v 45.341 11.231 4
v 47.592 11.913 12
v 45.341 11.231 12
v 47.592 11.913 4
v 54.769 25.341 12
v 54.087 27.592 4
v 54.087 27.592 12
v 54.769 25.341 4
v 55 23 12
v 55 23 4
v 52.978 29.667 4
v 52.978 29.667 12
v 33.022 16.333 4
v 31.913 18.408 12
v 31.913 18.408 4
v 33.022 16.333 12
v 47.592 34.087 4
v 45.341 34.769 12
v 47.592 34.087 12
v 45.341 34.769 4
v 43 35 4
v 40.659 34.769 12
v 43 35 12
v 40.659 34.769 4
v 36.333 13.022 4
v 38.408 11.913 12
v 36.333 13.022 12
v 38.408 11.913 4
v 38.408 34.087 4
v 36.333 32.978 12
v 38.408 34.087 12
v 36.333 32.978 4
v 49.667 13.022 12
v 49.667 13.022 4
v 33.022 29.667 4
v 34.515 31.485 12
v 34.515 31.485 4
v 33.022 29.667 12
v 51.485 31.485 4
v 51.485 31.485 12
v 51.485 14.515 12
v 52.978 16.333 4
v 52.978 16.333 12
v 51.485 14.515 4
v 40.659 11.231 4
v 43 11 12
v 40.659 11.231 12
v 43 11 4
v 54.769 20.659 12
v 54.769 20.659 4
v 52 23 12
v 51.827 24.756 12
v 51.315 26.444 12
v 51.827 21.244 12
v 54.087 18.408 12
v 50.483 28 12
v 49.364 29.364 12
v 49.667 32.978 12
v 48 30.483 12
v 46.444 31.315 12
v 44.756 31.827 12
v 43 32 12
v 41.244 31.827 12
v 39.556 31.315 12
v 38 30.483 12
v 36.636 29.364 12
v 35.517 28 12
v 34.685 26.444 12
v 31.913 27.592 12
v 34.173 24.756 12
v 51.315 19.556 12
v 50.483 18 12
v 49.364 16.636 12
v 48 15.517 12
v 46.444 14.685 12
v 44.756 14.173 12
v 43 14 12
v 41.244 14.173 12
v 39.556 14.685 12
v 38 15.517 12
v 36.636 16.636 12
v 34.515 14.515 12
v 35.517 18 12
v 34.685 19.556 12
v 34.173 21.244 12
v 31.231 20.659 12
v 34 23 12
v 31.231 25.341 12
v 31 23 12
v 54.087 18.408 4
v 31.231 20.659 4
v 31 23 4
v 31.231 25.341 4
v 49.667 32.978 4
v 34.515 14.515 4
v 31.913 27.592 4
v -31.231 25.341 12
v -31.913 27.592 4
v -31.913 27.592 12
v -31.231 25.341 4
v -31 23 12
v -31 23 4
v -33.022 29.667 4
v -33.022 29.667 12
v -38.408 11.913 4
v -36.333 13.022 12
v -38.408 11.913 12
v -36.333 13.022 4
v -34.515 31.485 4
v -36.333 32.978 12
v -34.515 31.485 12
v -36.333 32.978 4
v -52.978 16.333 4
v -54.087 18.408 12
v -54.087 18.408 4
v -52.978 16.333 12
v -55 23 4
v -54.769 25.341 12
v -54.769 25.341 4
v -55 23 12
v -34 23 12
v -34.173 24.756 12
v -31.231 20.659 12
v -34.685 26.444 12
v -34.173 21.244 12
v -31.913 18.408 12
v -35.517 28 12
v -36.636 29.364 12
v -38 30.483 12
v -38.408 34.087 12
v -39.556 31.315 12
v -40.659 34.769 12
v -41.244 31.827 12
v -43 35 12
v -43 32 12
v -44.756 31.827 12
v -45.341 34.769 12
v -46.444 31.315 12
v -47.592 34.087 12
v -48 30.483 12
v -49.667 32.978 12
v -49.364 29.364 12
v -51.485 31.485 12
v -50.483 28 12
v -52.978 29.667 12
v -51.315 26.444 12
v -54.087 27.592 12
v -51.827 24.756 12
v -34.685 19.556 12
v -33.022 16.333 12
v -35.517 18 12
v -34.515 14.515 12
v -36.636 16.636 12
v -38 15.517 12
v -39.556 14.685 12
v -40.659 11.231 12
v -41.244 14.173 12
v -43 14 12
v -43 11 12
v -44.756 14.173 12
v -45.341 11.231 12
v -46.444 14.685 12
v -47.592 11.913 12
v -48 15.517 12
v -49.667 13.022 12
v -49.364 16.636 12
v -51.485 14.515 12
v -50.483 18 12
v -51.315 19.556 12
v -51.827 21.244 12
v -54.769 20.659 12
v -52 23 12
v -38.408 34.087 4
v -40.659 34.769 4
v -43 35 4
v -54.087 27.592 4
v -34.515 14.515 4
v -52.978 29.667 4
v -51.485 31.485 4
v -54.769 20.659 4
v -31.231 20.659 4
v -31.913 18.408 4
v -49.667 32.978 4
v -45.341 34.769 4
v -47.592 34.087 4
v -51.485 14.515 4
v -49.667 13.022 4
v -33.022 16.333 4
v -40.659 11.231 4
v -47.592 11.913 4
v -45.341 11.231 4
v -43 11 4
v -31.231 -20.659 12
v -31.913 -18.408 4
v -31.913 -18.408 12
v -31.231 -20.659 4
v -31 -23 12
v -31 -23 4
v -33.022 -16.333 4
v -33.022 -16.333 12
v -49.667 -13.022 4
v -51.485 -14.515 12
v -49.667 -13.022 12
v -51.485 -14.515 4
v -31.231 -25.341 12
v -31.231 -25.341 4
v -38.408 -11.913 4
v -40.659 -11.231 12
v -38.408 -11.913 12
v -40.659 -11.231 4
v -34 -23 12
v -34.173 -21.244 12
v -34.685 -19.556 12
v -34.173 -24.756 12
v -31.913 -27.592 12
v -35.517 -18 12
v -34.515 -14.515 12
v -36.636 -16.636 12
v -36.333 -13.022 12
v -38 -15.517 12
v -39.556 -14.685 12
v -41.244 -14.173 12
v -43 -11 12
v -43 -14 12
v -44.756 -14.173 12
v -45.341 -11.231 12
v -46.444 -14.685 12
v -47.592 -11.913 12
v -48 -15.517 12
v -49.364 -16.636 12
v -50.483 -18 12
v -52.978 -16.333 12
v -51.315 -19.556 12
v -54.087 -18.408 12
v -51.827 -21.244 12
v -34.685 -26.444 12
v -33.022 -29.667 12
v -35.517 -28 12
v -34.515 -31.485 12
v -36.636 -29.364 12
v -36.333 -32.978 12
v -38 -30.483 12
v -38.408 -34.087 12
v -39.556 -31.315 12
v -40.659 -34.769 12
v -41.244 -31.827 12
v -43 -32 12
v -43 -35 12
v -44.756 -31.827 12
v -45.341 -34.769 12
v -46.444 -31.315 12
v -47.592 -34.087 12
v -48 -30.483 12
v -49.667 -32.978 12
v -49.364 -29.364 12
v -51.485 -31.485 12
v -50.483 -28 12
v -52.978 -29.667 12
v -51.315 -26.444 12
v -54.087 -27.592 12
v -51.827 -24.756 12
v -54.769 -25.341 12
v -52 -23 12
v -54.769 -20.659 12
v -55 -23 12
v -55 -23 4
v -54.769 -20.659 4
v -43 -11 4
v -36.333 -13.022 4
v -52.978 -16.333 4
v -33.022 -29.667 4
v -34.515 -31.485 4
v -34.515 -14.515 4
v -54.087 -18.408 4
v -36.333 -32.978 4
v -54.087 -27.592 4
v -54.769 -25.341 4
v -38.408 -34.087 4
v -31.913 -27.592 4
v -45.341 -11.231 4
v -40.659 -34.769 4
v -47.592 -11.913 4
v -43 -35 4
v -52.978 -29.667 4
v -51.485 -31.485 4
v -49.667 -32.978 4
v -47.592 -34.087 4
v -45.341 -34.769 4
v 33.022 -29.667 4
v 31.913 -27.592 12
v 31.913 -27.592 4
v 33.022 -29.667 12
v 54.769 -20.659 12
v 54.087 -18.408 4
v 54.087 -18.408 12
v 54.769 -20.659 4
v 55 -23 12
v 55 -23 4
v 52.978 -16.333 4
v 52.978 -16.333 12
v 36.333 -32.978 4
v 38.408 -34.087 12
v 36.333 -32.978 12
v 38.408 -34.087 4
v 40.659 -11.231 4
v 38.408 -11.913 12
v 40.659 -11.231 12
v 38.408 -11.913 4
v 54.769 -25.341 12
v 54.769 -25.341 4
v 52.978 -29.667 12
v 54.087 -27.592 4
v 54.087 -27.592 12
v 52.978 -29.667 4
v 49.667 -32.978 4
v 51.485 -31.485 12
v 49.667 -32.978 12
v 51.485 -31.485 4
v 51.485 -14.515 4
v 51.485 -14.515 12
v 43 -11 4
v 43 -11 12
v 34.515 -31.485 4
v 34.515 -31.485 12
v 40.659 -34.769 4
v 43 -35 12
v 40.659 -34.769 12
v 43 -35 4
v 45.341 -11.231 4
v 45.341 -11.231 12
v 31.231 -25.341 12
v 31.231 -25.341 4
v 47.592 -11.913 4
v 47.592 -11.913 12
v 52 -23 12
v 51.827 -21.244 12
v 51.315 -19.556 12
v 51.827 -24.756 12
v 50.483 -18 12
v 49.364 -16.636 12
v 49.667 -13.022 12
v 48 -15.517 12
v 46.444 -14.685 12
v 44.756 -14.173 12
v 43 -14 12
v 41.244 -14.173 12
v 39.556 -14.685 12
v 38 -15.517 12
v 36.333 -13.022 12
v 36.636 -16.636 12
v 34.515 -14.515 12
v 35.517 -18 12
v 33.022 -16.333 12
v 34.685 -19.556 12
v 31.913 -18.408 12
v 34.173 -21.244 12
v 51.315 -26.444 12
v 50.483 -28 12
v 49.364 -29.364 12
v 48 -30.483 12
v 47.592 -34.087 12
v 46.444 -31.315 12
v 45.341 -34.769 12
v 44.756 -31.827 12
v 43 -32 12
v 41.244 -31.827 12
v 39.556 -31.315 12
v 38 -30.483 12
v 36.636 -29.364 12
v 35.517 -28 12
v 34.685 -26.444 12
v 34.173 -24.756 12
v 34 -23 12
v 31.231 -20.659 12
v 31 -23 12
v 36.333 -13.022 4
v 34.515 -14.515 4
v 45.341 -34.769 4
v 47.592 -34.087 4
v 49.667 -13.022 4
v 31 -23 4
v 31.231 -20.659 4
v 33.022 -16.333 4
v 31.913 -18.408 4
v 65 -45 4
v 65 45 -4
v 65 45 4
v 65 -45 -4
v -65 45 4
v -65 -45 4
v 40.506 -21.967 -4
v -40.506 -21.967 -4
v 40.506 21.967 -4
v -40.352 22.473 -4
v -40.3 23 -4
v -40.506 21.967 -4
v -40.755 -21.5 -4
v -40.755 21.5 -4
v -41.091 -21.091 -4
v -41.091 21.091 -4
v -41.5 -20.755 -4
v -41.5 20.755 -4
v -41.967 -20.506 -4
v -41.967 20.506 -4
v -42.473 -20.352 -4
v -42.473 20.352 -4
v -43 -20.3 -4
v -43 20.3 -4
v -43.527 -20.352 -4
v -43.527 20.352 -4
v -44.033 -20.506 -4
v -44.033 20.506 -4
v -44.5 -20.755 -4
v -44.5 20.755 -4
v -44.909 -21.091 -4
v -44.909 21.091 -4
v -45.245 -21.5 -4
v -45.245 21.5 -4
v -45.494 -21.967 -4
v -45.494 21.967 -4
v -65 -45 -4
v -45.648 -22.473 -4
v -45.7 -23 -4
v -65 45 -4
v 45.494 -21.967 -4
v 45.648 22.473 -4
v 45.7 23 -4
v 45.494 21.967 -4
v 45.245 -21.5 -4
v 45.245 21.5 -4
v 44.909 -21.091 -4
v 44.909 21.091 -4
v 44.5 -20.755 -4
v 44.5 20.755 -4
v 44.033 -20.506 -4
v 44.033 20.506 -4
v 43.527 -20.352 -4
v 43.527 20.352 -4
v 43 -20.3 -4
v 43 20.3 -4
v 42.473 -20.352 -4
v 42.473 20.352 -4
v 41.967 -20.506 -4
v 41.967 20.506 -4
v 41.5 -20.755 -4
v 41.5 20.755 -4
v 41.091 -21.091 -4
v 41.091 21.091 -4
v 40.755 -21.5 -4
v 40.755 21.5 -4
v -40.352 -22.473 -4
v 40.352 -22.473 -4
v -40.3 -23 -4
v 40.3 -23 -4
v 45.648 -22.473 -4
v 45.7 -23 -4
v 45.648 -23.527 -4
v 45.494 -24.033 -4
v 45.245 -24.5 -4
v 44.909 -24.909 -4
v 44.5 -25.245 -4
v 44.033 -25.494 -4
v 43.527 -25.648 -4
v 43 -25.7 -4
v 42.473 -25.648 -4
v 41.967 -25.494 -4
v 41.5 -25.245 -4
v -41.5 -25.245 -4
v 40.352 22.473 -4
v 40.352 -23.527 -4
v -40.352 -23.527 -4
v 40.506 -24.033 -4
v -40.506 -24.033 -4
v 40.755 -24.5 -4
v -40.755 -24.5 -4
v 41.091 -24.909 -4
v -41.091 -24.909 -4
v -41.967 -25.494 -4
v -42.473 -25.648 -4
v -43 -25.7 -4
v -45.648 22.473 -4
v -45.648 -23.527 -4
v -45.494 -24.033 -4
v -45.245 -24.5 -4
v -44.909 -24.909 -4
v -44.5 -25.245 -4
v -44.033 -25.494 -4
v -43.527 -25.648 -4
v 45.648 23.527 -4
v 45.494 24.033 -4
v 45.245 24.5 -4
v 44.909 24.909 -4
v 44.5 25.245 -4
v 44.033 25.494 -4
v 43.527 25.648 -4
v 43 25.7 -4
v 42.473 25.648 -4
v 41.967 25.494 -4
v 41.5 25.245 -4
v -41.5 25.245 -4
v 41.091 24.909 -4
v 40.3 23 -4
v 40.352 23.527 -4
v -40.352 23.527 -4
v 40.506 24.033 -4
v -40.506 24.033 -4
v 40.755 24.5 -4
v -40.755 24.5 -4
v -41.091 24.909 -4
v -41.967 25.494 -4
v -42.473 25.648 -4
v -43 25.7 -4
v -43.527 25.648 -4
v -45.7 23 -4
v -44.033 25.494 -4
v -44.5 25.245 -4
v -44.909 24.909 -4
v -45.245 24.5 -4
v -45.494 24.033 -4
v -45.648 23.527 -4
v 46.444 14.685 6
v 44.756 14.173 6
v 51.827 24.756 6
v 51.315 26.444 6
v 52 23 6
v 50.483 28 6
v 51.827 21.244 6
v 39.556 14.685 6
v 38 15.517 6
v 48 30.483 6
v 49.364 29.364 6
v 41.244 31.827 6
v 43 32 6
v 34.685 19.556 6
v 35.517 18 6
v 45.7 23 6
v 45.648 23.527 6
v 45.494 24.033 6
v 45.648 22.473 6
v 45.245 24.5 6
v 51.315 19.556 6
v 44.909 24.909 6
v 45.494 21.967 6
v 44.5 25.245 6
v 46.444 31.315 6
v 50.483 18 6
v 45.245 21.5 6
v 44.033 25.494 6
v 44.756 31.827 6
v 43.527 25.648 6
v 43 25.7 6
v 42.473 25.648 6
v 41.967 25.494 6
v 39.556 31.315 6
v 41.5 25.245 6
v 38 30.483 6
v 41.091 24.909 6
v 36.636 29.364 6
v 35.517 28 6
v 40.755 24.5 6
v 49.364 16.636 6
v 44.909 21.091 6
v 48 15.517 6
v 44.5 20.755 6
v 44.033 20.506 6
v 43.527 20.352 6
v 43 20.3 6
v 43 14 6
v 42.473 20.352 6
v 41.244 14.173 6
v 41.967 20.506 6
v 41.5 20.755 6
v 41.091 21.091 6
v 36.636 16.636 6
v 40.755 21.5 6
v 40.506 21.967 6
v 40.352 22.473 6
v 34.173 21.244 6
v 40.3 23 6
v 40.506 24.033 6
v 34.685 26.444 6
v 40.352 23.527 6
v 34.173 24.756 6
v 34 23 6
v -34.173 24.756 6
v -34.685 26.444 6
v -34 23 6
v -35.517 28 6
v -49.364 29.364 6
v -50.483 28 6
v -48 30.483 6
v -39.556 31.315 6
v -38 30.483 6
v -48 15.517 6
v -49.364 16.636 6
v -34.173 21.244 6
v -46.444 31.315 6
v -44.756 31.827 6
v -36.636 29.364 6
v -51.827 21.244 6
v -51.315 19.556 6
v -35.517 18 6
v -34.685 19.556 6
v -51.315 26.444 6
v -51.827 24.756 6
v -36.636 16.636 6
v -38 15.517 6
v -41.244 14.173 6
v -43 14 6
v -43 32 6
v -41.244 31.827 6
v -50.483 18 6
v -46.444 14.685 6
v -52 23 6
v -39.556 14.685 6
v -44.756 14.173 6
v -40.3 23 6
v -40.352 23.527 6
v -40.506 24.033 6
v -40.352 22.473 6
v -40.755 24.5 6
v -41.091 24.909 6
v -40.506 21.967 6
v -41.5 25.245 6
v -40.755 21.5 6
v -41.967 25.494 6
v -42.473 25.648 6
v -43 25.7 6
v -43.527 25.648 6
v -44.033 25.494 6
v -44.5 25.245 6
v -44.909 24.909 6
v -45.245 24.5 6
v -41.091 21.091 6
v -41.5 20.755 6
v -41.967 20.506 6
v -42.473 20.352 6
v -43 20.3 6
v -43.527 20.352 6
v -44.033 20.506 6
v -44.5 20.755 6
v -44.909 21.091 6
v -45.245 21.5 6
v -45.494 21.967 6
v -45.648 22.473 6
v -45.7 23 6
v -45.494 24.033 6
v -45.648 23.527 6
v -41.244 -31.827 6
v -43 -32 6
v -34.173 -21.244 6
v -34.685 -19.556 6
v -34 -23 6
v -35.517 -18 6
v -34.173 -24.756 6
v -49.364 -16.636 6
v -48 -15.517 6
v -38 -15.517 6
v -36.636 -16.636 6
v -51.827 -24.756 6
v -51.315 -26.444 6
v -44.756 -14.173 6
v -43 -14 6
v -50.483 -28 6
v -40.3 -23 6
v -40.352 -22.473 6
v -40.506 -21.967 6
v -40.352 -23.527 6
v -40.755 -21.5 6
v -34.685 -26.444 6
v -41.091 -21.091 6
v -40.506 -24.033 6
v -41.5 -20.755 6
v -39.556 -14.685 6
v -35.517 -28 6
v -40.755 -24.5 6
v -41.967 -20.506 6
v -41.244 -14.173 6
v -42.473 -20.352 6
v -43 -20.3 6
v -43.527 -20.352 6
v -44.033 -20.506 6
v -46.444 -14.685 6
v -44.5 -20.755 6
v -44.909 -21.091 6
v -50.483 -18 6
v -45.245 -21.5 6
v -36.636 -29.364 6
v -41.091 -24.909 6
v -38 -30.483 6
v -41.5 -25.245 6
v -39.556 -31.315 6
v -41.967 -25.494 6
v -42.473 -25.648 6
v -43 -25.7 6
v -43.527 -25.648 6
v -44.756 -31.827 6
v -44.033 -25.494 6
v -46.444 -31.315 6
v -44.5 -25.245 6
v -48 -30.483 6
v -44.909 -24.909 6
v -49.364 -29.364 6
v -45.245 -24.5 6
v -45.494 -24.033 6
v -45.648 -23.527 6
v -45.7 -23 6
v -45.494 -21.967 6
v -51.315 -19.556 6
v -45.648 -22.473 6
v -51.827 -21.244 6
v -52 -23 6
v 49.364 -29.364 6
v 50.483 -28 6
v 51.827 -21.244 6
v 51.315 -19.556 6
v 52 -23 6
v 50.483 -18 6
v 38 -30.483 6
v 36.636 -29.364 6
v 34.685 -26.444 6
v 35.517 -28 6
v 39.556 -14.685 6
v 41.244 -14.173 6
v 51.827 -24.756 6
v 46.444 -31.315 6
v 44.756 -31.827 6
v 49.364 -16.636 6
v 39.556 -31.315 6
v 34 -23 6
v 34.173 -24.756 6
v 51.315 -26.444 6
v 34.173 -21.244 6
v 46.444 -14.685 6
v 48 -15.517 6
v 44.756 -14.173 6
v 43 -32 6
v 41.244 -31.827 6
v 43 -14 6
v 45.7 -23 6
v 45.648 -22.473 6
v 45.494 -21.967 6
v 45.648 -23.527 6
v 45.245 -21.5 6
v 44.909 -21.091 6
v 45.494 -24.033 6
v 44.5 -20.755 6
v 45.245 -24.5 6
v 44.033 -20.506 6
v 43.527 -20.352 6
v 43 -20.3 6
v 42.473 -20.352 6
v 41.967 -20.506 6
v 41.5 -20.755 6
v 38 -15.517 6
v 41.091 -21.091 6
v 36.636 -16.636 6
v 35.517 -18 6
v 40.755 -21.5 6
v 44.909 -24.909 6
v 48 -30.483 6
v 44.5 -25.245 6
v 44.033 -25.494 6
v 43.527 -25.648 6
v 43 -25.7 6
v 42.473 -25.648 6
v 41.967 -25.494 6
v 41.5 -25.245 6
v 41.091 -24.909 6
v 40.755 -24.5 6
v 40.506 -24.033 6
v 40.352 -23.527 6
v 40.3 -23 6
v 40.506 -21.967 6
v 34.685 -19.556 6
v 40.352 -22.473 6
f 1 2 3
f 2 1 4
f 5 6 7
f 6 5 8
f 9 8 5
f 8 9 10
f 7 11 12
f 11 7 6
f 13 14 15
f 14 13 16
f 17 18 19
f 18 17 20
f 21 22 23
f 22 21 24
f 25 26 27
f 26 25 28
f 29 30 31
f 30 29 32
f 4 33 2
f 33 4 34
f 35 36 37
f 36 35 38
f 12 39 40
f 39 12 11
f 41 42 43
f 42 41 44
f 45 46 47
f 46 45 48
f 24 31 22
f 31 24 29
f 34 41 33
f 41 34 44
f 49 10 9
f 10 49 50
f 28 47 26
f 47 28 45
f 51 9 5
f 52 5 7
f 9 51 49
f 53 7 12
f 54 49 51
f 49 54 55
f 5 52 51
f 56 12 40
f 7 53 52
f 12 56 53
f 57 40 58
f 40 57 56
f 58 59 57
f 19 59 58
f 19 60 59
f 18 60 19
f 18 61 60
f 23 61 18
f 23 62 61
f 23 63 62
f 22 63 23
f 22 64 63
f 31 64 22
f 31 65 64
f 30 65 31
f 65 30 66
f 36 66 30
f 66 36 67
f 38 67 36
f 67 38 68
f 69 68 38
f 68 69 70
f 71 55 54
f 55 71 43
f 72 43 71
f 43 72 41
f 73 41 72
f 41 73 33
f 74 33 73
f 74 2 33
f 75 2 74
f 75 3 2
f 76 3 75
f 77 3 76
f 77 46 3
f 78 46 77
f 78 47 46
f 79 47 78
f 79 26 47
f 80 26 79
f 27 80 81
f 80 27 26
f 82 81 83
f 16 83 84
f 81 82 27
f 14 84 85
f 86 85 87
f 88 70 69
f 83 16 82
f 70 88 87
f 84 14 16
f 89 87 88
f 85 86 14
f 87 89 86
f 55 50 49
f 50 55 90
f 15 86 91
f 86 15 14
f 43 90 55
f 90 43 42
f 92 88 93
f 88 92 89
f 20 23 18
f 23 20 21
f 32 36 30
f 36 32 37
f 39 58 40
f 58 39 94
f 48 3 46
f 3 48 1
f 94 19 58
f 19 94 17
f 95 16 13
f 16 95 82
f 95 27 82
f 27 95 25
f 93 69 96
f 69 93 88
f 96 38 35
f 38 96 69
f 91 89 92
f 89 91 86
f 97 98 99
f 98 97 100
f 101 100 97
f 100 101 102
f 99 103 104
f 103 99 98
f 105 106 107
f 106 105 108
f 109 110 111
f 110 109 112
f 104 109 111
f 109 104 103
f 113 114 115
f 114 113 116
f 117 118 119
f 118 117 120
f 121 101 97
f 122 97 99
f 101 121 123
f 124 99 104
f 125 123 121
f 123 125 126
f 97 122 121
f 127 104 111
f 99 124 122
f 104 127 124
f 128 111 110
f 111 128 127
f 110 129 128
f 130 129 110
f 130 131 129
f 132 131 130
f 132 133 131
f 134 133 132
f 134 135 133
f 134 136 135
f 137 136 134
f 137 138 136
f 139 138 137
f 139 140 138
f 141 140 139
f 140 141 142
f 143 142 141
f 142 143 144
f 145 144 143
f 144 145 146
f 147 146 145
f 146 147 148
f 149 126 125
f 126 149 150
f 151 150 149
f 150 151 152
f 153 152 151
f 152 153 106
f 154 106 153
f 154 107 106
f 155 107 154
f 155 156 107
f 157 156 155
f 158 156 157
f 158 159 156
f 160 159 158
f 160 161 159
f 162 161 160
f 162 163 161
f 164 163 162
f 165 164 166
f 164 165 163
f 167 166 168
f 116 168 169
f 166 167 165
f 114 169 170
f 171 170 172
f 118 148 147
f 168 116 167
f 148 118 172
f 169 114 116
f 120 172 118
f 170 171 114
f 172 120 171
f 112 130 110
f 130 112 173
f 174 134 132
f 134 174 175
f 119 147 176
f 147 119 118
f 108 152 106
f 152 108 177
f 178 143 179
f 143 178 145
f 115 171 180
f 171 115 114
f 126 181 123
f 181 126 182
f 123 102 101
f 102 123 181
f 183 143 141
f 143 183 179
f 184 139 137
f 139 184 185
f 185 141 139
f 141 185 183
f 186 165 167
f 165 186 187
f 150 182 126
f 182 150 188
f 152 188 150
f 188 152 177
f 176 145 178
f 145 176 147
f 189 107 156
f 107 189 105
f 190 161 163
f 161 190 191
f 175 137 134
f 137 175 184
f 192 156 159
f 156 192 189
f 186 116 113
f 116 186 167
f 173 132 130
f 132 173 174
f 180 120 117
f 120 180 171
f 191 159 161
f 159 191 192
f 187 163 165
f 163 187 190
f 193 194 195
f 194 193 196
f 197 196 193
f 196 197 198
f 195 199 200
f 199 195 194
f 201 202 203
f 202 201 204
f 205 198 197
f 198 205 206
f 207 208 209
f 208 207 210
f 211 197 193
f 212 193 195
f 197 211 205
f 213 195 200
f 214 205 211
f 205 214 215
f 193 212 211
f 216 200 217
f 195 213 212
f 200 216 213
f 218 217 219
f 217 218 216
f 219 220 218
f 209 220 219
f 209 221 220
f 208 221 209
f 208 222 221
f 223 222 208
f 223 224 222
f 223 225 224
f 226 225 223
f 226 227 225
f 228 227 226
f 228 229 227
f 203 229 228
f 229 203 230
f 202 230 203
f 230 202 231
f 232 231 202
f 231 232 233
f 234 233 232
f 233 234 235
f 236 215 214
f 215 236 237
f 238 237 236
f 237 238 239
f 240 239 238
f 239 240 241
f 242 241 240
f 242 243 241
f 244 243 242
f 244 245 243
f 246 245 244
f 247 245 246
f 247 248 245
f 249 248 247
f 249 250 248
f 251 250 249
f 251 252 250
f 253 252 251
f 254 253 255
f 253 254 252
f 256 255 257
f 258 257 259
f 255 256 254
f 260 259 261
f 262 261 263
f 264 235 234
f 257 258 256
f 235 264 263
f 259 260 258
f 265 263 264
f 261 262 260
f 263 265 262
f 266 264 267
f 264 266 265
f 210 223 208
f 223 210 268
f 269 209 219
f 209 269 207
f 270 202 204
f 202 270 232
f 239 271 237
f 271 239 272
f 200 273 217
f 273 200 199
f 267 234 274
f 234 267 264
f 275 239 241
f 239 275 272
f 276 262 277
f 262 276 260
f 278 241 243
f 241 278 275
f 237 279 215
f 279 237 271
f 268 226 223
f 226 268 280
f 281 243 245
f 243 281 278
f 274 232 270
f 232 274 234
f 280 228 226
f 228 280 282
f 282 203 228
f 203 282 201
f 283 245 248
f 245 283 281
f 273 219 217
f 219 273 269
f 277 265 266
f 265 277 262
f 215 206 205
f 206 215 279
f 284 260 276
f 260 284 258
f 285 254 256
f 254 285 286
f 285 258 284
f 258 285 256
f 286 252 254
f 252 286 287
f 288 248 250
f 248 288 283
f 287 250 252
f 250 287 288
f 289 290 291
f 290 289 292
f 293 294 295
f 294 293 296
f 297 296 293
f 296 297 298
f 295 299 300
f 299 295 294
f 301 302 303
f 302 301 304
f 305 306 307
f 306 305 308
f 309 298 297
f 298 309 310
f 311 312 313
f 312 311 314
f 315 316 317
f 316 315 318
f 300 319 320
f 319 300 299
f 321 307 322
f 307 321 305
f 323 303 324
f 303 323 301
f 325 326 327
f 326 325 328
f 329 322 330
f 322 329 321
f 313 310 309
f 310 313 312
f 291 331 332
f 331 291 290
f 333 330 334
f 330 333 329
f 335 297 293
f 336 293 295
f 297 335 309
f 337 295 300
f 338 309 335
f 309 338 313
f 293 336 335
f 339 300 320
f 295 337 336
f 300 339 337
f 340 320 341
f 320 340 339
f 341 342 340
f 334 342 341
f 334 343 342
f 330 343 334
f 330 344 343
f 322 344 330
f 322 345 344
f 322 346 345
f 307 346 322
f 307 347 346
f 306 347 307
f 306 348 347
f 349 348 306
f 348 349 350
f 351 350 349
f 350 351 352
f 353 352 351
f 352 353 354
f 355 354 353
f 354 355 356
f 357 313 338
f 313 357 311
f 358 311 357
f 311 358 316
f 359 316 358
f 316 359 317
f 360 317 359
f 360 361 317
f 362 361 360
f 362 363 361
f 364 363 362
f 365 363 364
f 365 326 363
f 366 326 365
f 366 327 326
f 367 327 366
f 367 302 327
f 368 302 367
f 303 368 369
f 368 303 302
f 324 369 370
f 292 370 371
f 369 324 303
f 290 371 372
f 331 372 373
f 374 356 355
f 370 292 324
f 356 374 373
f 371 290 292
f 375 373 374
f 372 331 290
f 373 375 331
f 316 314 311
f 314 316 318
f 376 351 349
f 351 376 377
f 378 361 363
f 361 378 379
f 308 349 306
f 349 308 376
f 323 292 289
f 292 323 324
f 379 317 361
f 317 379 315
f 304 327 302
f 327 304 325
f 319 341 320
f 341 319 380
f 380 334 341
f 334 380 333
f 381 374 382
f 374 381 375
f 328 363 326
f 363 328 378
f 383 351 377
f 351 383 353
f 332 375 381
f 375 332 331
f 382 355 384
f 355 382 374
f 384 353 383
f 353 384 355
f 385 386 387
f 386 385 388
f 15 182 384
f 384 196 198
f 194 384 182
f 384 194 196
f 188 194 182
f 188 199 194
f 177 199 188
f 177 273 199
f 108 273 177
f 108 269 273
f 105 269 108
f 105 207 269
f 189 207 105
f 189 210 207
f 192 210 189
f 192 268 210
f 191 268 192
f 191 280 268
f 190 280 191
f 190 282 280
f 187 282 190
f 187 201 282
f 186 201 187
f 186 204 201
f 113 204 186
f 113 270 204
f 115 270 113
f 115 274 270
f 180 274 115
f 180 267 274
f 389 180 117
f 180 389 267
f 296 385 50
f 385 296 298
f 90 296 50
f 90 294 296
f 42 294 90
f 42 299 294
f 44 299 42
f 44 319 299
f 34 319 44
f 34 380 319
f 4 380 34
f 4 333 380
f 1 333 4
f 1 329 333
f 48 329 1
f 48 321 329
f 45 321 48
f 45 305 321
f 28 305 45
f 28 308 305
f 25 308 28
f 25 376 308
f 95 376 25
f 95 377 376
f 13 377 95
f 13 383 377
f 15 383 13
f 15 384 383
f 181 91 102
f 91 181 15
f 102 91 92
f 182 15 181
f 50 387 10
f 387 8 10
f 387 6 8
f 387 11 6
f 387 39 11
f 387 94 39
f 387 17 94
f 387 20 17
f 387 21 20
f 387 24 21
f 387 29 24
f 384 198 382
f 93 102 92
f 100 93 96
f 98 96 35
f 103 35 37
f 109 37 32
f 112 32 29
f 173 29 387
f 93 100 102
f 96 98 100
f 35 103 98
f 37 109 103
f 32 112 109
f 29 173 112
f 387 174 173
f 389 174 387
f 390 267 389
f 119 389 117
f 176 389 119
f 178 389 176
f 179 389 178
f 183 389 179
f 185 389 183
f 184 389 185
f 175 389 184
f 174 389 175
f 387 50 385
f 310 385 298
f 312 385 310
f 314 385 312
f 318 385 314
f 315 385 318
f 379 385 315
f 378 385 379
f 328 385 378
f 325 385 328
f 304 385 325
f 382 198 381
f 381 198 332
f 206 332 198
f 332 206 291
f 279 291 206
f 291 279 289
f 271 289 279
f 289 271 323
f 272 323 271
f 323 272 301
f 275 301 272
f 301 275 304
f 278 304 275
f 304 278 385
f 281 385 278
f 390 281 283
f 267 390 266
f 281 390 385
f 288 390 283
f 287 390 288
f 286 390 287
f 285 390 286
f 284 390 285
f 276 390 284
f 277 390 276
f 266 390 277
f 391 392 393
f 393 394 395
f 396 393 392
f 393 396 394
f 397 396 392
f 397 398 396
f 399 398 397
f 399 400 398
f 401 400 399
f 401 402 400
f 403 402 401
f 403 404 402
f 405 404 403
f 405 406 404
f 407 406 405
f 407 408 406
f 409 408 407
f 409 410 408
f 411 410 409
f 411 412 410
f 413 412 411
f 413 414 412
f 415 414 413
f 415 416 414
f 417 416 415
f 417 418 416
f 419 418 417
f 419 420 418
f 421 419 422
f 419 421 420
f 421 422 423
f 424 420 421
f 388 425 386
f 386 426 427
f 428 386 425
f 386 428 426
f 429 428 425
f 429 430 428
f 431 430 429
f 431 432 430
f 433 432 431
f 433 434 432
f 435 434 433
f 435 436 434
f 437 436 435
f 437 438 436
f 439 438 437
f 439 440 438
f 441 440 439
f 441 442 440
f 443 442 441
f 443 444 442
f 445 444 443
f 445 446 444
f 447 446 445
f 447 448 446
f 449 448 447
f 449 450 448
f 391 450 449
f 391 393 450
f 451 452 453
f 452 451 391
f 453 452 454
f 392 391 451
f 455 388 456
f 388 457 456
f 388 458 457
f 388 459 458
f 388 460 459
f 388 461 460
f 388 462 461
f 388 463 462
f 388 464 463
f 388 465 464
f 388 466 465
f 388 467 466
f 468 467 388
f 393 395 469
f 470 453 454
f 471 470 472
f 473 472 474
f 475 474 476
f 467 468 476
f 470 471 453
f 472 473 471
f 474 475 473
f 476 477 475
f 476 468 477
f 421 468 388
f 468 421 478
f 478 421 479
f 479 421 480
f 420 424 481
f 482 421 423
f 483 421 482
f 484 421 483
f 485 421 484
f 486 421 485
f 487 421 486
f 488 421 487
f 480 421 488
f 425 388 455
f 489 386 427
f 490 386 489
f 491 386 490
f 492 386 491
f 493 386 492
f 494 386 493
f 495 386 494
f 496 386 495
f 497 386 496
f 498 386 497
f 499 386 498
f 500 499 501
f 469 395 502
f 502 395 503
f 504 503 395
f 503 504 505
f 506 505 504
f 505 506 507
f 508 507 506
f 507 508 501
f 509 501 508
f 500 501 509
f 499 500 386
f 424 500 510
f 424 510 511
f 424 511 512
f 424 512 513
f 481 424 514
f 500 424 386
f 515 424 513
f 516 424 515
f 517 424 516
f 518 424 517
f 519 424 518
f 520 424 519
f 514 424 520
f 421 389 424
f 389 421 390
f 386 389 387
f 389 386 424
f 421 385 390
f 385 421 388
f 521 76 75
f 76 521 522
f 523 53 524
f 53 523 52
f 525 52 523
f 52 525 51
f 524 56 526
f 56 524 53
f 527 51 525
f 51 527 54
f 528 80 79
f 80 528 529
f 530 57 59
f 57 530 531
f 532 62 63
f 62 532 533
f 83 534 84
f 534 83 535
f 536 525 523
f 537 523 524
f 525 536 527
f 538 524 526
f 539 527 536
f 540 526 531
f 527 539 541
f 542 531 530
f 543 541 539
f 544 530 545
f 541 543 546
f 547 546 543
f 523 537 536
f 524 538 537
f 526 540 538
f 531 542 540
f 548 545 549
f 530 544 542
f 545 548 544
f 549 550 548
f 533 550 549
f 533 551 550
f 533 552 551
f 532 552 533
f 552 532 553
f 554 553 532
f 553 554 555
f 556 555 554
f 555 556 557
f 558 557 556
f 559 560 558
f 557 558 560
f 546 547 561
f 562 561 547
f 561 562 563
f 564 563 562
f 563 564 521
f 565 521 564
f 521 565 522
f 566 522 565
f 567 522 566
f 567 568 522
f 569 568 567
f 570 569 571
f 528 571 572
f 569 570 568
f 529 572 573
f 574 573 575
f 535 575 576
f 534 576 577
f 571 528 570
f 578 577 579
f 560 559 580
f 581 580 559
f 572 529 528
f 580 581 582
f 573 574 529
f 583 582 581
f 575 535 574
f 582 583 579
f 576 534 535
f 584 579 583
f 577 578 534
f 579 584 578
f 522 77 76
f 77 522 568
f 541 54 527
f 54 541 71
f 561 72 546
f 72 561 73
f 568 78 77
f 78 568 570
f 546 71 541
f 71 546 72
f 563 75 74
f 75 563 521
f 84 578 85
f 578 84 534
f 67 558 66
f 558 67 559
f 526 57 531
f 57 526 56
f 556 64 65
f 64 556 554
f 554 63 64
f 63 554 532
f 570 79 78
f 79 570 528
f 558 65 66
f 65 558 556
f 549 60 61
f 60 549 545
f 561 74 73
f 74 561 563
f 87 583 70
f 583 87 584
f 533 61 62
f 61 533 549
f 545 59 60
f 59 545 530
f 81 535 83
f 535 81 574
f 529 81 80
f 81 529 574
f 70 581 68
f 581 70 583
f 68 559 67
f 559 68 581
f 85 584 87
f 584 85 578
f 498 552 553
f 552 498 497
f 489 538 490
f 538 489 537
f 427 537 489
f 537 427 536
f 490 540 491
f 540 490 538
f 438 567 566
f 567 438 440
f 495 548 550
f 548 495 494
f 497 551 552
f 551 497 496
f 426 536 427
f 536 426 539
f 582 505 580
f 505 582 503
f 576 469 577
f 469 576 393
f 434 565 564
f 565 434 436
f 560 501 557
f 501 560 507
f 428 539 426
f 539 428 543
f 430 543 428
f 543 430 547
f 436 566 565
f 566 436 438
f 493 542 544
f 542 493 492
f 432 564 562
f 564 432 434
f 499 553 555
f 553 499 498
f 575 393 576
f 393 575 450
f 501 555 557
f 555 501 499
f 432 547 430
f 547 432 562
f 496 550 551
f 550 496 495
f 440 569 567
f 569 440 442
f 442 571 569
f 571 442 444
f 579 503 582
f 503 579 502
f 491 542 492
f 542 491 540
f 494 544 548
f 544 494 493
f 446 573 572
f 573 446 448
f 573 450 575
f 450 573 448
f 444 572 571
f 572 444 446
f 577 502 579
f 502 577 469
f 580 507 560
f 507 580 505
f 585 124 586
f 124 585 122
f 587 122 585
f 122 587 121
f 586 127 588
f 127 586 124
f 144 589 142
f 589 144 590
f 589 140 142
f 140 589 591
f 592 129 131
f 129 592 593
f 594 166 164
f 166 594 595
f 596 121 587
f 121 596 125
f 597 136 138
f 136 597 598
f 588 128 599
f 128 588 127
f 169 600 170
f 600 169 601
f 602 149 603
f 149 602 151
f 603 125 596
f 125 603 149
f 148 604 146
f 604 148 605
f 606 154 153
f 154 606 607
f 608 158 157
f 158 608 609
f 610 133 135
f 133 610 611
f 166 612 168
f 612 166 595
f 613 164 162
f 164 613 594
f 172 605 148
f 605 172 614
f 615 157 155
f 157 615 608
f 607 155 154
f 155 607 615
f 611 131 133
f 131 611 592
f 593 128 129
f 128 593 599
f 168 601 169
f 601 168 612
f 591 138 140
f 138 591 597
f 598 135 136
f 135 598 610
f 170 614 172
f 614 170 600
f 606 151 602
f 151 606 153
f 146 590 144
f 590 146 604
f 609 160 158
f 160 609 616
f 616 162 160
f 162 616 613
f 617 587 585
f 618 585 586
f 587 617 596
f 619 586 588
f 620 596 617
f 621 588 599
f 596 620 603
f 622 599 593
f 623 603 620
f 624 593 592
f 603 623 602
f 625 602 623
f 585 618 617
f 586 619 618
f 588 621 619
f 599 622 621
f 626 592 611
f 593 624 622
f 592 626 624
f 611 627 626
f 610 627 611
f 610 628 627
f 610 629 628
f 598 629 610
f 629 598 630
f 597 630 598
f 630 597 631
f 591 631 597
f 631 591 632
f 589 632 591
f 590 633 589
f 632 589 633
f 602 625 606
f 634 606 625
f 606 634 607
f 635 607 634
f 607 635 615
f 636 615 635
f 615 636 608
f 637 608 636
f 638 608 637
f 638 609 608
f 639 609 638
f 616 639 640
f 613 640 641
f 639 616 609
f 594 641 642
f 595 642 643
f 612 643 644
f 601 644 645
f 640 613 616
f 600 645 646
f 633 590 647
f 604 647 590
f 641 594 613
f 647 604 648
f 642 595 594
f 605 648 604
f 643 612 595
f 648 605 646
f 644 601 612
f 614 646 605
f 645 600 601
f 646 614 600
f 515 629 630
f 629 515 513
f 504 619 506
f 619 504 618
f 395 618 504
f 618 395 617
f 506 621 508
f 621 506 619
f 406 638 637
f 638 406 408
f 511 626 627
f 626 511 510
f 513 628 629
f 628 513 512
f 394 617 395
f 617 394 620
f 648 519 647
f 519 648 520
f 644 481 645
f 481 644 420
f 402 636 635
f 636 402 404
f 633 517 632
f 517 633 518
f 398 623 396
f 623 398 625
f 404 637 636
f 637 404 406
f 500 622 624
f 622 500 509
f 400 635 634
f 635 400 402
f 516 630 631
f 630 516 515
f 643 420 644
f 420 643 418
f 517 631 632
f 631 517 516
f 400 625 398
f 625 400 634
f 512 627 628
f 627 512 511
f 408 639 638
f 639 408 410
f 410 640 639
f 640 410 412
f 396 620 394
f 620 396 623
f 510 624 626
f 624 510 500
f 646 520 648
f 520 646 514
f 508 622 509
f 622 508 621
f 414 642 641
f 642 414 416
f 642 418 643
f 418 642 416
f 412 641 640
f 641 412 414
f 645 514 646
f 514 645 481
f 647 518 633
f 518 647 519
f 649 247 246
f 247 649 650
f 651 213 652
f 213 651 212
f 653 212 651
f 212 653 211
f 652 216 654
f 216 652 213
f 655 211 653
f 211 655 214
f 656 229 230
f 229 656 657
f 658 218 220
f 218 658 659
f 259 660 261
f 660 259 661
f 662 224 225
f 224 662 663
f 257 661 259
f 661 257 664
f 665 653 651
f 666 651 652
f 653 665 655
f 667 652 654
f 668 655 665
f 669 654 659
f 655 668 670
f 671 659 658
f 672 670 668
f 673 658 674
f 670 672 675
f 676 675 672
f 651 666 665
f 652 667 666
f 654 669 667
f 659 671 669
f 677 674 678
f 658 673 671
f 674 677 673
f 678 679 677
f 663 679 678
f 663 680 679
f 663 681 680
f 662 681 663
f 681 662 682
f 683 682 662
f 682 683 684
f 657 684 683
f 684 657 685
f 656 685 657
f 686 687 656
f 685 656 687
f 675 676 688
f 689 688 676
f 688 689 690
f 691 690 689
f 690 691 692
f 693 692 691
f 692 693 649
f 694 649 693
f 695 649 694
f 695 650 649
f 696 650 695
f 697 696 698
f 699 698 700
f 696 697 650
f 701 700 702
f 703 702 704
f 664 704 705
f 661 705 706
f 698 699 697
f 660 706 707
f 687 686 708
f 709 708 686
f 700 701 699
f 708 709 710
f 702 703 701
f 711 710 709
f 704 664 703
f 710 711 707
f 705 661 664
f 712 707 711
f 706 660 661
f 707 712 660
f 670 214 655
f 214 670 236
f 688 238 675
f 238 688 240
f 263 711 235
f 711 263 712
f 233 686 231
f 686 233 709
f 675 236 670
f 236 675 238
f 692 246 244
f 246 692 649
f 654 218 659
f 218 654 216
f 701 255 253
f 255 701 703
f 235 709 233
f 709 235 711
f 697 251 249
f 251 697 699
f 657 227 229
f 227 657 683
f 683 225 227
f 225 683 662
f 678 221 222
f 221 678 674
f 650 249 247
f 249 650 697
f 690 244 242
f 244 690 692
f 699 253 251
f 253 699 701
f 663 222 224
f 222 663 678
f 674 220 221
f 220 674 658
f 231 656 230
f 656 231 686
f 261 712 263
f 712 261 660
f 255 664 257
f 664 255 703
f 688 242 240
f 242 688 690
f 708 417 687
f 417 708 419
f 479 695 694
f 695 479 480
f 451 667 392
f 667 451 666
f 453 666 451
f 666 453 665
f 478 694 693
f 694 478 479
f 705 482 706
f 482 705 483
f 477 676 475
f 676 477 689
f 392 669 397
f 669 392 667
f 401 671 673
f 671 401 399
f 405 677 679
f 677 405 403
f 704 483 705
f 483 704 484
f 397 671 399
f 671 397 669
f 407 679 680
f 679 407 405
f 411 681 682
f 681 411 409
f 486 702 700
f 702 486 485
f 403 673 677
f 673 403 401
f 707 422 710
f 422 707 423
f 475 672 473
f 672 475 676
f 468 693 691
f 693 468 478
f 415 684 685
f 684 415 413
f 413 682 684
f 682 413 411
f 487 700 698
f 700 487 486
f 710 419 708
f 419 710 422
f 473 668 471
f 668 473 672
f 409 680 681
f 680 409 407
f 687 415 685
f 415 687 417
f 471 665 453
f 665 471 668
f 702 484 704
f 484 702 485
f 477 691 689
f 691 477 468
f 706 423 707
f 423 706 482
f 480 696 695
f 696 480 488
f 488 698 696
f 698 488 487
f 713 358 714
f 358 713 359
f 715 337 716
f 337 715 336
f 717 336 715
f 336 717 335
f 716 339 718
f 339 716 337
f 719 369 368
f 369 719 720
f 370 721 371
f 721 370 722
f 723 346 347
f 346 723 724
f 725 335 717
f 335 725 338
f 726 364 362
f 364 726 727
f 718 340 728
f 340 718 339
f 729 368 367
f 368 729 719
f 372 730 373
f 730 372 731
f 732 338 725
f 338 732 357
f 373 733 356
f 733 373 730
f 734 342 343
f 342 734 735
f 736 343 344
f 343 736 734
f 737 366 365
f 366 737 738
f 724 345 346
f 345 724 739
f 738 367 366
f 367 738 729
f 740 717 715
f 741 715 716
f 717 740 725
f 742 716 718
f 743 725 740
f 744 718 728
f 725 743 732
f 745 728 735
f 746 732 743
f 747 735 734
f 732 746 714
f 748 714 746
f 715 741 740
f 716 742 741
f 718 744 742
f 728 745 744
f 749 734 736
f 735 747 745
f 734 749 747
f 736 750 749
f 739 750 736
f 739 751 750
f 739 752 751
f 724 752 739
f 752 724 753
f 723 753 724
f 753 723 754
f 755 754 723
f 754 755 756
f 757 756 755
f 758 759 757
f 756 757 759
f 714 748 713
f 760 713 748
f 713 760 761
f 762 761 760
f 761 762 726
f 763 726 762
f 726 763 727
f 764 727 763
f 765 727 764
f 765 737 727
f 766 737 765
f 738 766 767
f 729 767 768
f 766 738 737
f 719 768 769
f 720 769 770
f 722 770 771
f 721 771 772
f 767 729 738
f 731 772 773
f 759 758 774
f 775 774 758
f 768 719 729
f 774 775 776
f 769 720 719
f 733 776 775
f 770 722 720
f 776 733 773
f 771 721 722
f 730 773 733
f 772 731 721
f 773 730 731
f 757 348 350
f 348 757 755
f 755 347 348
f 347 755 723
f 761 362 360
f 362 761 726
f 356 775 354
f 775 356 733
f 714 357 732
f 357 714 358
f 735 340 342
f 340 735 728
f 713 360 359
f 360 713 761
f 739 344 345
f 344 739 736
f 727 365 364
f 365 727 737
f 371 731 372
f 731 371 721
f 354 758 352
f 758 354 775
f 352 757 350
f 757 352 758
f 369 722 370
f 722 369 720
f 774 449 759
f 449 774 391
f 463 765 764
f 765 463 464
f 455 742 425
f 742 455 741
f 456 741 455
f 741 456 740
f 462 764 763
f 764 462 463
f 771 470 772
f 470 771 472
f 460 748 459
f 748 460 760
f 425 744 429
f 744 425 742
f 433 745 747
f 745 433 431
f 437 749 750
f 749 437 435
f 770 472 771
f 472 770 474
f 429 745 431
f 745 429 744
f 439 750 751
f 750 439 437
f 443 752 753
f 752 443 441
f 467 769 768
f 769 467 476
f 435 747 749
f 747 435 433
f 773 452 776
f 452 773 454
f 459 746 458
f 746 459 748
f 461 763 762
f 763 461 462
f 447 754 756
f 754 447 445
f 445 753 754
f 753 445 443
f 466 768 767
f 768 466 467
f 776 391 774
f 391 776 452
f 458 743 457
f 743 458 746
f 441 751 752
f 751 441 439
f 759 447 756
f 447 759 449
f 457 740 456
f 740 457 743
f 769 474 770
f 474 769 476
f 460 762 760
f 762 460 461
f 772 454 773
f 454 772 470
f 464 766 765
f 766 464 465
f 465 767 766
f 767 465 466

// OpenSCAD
$fn = 32;

// ----------------------------------------------------------------------
// Socket pad plate
// bosses with counterbored sockets for the screws
// ----------------------------------------------------------------------

// --- parameters (mm) ---
base_t = 8;            // base plate thickness
boss_h = 8;            // boss height above the base plate
boss_d = 24;           // boss diameter
socket_d = 18;         // socket diameter
socket_depth = 6;      // socket depth from the boss face
bolt_d = 5.4;          // screw clearance hole through the socket floor
plate = [130, 90, 8];  // overall size (x, y, z)
edge = 22;             // boss centre offset from the plate edge
pads = 4;              // boss count, one per corner

// --- derived feature positions (mm) ---
height = base_t + boss_h;        // = 16   overall height of the part
corner_x = plate[0] / 2 - edge;  // = 43   boss centre X
corner_y = plate[1] / 2 - edge;  // = 23   boss centre Y
feature_centers = [
  [corner_x, corner_y],
  [-corner_x, corner_y],
  [-corner_x, -corner_y],
  [corner_x, -corner_y]
];   // boss centres: sockets, holes and the pads themselves are placed from here

// base plate, bosses on feature_centers, socket + through hole in each
difference() {
  union() {
    cube(plate, center = true);
    for (centre = feature_centers)
      translate([centre[0], centre[1], plate[2] / 2 - 1])
        cylinder(d = boss_d, h = boss_h + 1);
  }
  for (centre = feature_centers) {
    translate([centre[0], centre[1], plate[2] / 2 + boss_h - socket_depth])
      cylinder(d = socket_d, h = socket_depth + 1);
    translate([centre[0], centre[1], -height])
      cylinder(d = bolt_d, h = 2 * height + 2);  // through the socket floor
  }
}
